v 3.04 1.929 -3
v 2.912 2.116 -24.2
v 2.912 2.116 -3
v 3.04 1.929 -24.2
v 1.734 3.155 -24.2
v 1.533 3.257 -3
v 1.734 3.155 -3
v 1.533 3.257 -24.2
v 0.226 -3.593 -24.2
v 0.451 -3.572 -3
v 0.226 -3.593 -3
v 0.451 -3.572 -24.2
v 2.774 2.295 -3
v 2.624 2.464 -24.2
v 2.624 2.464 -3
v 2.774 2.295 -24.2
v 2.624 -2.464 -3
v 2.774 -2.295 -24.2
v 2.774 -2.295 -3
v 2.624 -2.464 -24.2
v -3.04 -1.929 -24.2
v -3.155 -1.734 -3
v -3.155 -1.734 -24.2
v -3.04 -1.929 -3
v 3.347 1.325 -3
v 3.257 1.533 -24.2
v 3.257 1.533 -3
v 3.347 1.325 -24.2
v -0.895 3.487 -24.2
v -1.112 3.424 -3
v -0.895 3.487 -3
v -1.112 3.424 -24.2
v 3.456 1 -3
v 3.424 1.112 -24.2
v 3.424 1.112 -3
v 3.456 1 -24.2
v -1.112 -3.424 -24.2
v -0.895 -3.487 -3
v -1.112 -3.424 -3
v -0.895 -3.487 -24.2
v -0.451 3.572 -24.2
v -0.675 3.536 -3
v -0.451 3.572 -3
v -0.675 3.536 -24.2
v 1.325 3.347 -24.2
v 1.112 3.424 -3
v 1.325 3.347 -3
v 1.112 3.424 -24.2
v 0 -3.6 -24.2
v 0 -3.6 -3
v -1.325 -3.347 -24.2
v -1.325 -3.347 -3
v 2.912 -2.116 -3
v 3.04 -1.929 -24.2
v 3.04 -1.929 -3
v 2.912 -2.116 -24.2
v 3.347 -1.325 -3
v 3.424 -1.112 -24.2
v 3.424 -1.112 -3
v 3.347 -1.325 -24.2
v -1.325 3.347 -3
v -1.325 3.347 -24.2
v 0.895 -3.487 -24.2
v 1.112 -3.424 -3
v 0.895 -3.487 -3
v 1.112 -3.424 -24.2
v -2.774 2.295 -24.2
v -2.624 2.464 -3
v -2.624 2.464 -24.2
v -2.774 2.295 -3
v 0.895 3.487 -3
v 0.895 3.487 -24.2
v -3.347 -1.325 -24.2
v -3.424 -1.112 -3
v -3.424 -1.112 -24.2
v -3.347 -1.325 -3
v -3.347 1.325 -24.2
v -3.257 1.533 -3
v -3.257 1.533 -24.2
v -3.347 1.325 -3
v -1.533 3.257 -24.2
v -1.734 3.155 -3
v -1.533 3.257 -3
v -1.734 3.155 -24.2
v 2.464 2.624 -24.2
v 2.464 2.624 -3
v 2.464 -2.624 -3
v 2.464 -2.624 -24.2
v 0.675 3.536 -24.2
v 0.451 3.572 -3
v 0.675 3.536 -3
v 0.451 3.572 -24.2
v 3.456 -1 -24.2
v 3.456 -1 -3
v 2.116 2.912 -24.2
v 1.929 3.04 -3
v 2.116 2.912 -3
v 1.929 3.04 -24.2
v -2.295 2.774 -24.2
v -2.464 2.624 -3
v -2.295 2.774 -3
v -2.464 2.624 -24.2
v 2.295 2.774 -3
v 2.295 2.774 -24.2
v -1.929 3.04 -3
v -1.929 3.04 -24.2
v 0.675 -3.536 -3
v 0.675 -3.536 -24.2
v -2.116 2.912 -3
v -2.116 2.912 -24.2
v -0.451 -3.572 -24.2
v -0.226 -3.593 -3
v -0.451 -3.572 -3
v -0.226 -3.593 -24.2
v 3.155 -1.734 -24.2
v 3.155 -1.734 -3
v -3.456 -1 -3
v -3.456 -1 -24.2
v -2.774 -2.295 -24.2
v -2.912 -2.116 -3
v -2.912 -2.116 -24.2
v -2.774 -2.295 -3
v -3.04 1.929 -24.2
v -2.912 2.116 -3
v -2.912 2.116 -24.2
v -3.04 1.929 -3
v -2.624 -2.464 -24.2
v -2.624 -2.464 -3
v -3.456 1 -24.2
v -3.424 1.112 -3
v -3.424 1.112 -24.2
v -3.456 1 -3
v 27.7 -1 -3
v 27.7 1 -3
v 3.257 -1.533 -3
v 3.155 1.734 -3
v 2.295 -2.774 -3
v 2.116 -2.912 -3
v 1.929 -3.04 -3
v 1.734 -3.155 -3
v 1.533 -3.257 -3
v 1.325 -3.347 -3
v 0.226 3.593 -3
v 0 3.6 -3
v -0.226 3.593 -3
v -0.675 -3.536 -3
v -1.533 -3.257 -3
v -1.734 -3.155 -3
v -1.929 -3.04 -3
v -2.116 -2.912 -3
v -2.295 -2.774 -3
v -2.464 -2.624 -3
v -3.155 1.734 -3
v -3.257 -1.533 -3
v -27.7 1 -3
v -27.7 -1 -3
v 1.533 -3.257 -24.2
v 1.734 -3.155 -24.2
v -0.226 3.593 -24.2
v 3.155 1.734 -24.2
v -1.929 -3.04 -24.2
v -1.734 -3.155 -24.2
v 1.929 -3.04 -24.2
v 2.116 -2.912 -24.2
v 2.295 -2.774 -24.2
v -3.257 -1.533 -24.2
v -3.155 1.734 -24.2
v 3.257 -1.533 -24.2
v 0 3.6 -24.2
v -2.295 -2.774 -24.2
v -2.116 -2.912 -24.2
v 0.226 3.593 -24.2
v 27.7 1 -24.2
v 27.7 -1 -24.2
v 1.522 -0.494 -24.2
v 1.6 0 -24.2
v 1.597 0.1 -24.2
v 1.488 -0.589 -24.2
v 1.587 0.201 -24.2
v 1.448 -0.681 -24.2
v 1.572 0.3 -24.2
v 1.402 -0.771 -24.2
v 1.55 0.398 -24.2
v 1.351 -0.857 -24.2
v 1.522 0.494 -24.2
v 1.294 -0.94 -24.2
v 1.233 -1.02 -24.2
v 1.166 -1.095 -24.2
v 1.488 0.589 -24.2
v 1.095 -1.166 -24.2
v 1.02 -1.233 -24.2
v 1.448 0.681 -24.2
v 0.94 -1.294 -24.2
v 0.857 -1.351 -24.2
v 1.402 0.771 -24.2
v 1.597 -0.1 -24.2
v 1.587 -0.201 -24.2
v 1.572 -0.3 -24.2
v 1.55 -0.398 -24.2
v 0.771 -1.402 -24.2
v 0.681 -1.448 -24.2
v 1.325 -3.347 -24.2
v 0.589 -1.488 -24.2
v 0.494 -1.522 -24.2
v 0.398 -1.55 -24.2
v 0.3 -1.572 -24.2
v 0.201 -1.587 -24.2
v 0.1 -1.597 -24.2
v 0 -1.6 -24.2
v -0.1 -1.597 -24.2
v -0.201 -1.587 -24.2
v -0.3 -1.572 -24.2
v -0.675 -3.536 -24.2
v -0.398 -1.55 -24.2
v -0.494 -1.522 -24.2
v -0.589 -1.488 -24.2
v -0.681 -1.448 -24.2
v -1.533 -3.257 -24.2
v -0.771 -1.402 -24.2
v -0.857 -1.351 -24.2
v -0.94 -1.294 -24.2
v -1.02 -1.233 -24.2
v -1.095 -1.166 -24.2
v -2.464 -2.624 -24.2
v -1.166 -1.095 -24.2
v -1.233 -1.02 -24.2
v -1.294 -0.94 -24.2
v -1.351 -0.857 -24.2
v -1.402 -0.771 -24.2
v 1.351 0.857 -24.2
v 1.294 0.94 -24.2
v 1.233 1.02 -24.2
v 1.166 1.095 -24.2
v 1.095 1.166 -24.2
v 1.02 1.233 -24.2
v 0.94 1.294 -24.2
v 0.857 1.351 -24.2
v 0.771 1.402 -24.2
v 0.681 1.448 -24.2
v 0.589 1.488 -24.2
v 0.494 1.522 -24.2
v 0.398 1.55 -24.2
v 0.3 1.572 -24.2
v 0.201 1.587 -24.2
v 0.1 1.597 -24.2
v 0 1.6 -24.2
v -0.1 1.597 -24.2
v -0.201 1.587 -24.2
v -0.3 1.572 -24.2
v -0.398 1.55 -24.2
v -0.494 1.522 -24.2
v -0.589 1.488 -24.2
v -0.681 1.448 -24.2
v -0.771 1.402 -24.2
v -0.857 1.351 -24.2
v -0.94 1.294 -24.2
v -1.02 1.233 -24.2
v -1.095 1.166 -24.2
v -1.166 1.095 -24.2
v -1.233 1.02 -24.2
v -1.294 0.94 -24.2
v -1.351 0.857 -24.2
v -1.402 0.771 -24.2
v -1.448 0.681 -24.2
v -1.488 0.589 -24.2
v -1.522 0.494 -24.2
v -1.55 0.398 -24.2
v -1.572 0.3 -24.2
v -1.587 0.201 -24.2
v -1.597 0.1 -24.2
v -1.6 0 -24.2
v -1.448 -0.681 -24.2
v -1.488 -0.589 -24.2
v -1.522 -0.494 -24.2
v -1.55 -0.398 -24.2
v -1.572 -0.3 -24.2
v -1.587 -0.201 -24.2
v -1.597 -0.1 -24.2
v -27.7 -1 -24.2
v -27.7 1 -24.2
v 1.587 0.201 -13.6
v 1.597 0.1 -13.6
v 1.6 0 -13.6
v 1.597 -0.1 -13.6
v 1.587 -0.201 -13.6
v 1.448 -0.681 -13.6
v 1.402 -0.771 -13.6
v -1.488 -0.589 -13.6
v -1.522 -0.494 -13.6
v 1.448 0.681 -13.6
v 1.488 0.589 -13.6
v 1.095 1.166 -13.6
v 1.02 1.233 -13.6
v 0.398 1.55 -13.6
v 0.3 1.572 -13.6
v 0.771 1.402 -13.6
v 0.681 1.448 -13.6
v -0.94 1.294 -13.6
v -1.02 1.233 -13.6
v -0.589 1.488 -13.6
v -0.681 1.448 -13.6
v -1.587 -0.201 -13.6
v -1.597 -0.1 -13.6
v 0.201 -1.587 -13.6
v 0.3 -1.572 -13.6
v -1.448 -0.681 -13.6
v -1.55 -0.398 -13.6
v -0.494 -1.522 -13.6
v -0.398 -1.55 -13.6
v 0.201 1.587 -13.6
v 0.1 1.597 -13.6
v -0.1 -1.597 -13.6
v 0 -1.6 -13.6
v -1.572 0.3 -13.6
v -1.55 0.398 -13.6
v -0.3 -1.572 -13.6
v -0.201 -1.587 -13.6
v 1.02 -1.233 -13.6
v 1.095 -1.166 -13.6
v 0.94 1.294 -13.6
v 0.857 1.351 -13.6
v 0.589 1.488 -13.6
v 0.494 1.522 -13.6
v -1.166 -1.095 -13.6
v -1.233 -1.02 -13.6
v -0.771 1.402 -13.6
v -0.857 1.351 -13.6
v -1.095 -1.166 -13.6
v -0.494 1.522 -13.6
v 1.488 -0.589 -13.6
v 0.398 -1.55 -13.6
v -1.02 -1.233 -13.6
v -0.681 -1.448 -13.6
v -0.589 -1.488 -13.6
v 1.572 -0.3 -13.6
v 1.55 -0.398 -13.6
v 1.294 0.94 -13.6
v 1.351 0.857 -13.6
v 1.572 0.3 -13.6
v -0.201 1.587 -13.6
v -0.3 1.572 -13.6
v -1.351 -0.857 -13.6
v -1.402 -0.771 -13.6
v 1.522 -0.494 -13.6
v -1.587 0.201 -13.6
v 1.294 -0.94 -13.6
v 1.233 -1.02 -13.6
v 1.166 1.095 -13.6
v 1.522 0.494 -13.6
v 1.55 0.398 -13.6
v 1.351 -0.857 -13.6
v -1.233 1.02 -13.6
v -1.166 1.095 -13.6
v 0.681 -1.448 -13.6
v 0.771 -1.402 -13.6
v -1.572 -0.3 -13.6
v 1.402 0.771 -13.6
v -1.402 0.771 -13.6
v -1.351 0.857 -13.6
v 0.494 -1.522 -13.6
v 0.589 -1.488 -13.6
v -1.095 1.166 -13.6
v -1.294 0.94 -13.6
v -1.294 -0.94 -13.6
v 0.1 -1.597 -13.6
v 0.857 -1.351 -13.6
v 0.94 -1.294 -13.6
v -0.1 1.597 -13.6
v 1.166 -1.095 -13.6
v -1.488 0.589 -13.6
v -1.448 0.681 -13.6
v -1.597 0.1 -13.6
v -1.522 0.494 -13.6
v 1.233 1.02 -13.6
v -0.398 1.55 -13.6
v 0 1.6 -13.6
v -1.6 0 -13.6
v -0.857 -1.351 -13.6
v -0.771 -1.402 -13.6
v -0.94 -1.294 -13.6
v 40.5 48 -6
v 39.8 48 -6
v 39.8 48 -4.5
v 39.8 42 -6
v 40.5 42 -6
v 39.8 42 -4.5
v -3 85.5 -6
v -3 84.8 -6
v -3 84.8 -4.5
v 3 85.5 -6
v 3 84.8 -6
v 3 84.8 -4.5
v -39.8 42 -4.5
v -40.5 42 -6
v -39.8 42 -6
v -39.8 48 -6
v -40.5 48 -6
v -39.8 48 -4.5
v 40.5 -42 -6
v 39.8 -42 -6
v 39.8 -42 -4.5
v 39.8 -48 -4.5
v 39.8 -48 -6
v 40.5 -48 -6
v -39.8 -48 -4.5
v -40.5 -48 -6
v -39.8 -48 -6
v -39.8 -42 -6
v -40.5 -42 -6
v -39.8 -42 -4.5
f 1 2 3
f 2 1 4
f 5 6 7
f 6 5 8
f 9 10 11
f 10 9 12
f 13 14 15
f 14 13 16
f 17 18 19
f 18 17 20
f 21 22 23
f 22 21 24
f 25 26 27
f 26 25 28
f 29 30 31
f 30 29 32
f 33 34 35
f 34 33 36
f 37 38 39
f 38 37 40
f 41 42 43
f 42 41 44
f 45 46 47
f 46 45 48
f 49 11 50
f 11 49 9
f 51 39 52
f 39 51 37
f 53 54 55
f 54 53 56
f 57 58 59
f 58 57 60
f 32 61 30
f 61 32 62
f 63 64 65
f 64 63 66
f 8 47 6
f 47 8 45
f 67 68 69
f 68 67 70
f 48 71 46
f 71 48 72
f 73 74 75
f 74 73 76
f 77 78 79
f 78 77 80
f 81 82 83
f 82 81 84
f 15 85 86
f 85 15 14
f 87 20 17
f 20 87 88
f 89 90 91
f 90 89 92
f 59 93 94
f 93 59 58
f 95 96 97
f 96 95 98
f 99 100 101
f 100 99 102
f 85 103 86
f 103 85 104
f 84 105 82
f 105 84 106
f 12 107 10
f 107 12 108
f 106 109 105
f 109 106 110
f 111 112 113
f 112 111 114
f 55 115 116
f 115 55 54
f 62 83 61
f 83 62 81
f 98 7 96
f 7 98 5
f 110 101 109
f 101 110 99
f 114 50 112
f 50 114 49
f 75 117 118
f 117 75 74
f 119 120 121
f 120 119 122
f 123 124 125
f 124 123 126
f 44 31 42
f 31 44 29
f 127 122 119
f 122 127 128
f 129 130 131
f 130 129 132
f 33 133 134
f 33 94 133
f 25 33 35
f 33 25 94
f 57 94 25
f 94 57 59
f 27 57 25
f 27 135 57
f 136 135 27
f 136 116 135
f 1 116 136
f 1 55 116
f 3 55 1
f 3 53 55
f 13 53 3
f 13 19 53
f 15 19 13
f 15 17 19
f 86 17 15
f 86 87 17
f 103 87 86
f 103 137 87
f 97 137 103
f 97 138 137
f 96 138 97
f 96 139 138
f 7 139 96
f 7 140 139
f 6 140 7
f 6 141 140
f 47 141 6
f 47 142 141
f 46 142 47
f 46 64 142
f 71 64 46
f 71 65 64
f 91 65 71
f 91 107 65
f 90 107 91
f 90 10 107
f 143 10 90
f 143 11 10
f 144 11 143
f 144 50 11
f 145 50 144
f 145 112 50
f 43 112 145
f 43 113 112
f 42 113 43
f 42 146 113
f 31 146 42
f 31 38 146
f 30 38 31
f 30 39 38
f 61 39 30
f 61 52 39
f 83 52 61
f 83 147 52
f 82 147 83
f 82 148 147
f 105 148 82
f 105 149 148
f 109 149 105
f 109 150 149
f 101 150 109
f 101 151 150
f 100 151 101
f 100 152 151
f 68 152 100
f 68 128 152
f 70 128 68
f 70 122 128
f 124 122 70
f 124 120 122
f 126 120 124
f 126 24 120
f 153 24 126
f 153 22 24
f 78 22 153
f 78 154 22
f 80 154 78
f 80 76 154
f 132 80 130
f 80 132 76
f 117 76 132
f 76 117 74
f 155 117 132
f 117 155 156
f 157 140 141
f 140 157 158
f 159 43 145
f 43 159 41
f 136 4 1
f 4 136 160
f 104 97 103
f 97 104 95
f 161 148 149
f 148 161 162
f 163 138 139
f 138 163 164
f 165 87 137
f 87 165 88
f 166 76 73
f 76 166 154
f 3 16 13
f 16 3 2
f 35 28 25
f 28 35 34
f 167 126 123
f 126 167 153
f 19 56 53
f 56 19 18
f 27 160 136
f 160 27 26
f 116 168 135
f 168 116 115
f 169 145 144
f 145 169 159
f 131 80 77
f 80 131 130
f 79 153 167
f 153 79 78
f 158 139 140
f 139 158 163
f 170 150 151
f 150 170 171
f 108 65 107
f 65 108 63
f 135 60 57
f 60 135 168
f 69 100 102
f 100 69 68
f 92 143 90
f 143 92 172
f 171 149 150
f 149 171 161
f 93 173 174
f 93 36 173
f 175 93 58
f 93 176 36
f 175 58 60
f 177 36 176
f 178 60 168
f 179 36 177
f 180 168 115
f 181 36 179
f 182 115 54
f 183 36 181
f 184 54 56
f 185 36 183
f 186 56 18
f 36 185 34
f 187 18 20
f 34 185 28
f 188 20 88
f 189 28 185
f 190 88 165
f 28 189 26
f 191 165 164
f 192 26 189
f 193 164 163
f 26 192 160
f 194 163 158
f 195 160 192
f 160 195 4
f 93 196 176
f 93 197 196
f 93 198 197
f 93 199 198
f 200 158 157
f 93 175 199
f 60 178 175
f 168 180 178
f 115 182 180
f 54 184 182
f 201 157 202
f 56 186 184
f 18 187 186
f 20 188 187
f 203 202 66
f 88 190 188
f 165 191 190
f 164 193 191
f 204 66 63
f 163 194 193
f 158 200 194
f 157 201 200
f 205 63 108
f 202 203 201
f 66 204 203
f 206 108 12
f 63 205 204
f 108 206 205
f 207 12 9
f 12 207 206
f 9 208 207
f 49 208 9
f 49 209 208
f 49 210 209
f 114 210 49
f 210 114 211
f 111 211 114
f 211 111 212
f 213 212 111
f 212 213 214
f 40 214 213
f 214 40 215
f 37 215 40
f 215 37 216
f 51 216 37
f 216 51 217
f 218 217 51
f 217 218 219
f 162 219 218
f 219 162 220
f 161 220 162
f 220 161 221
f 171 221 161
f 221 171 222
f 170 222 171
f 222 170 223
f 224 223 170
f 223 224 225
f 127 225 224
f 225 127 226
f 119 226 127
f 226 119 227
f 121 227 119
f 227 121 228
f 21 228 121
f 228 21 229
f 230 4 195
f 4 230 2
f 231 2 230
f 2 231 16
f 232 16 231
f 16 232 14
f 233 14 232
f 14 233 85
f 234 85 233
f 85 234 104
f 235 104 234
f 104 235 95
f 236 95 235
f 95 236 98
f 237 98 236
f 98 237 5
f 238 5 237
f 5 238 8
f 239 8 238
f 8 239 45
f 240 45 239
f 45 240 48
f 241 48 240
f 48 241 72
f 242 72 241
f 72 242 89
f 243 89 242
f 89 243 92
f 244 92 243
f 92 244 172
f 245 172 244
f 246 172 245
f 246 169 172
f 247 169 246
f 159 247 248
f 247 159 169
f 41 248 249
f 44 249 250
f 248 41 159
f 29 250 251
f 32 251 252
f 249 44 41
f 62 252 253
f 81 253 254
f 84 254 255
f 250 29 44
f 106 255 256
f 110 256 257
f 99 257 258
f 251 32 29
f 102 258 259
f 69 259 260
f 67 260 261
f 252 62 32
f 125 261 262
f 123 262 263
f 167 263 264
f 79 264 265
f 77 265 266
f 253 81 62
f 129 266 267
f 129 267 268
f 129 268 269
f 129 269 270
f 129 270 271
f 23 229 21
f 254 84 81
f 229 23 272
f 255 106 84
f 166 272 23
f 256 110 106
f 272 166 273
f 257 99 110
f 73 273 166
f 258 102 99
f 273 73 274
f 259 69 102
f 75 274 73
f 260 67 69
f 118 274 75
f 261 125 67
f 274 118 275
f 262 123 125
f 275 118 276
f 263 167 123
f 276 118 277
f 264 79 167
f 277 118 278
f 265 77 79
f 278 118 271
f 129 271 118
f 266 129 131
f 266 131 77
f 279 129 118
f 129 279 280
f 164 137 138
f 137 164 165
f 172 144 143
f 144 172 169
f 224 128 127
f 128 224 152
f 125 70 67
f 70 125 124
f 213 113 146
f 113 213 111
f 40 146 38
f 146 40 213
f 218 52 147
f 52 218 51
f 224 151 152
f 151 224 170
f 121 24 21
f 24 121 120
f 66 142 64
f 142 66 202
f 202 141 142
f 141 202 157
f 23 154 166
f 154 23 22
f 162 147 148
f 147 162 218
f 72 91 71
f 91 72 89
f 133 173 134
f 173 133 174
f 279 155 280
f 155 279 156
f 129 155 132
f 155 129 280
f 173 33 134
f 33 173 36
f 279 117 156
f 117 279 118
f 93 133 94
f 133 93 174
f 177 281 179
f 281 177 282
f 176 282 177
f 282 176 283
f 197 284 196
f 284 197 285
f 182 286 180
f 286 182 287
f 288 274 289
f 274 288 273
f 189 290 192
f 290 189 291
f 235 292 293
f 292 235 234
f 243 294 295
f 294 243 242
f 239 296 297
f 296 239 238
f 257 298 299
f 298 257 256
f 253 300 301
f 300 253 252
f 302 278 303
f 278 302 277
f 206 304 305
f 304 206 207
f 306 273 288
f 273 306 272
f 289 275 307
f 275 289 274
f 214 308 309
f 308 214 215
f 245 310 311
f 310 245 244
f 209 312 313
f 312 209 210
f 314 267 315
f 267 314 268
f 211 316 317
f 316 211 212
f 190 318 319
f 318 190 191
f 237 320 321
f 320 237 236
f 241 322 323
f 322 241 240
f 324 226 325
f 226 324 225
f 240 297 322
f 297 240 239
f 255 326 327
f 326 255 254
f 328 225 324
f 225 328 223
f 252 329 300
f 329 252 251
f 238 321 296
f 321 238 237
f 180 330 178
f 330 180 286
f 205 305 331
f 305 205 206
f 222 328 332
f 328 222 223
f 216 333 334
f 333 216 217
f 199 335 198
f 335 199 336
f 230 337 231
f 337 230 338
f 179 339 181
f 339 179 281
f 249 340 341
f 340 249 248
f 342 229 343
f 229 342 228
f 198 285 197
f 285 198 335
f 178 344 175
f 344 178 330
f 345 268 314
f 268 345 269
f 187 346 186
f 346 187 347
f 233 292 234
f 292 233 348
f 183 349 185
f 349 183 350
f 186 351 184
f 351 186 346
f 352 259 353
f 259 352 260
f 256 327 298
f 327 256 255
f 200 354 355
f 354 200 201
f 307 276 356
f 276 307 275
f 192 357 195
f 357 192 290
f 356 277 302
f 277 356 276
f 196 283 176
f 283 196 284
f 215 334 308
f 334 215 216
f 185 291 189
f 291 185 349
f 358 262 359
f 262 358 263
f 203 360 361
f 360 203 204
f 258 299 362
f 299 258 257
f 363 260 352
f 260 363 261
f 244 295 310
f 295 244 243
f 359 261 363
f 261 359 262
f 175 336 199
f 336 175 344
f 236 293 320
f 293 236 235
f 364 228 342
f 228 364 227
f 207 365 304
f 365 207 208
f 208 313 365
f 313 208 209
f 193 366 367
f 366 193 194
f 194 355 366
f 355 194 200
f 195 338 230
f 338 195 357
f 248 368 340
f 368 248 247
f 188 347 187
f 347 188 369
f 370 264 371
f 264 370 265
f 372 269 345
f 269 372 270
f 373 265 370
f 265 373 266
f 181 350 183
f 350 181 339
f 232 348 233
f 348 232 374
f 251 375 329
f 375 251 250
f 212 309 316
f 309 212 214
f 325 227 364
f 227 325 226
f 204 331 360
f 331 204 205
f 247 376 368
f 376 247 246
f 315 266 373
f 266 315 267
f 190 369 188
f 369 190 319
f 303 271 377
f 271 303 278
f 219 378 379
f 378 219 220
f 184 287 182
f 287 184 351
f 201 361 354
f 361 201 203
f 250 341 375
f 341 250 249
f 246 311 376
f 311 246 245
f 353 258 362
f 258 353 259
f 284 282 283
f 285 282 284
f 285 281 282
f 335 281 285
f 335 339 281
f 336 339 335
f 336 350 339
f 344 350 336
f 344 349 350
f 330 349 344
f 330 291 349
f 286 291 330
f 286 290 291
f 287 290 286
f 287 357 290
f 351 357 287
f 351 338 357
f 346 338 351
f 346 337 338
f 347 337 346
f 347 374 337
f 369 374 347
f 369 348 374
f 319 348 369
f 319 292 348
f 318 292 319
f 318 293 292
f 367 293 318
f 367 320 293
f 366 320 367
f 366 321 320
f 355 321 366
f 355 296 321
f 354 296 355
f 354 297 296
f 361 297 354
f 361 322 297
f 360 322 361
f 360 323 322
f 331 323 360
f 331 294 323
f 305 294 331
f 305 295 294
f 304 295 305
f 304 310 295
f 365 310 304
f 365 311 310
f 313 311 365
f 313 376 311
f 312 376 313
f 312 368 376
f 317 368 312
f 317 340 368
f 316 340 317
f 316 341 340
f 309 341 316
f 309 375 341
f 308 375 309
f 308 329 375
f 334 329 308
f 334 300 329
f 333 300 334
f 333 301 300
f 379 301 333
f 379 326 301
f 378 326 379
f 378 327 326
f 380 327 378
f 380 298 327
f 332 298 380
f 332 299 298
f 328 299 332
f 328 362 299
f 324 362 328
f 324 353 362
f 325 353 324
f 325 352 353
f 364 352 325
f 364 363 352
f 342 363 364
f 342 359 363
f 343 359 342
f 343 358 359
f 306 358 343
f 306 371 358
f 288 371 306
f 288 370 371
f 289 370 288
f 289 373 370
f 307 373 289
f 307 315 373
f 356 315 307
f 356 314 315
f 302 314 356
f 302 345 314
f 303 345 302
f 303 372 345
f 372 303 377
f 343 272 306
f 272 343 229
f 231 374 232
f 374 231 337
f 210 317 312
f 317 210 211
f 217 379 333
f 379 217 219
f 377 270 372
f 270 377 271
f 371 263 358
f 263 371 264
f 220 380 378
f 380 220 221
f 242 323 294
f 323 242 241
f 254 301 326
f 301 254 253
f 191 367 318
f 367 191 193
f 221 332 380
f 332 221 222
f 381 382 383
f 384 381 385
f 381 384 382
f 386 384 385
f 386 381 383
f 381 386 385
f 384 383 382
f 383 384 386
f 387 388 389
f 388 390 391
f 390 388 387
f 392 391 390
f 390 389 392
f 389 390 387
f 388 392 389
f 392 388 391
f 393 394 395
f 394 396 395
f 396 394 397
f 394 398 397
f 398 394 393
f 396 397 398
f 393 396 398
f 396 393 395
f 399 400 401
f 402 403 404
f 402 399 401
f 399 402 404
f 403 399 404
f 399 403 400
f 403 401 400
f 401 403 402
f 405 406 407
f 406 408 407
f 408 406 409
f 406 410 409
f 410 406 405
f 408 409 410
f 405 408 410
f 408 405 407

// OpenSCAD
// file: Bevel_Extrude_Module_for_OpenSCAD/bevel_extrude.scad
bevel_extrude_example();

module bevel_extrude_example()
{
	bevel_extrude(height=10,bevel_depth=2,$fn=16) 
	example_shape();
}

module example_shape()
{
	union()
	{
		square([8,30],true);
		rotate(30)
		square([35,8],true);
	
		translate([0,15])
		square([30,8],true);
	}
}

module bevel_border(size=1)
{
	difference()
	{
		minkowski()
		{
			child();
			square(size,true);
		}
		child();
	}
}

module bevel_cutaway(bevel_depth=5)
{
	translate([0,0,-bevel_depth])
	minkowski()
	{
		linear_extrude(height=bevel_depth,convexity=5)
		bevel_border(1)
		child();
		cylinder(h=bevel_depth+1,r1=0,r2=bevel_depth*sqrt(2));
	}
}

module bevel_extrude(height=20,bevel_depth=1)
{
	difference()
	{
		linear_extrude(height=height,convexity=5)
		child();

		translate([0,0,height])
		bevel_cutaway(bevel_depth)
		child();
	}	
}
// main file
// CO2 Ampel - Case
// By: FabLab Karlsruhe e.V., Martina Feger
// Date: 19.10.2020
// License: MIT

// https://www.thingiverse.com/thing:135408/files
use <Bevel_Extrude_Module_for_OpenSCAD/bevel_extrude.scad>

$fn=100;
pcb_length=168;
pcb_width=78;

wall=2; //min=2 !
base=2;
lidThick=3;
gap=1;  //puffer (auf jeder seite) zwischen pcb und gehaeuse

lid();

module lid(){
    difference(){
        union(){
            mirror([0,0,1]) translate([-39,-84,lidThick]) mirror([0,0,1]) bevel_extrude(height=lidThick, bevel_depth=(0.5*lidThick), $fn=50) offset(r=wall+gap) import (file = "/mnt/io/gemeinsam/co2ampel/pcb.dxf");
            screwFastening();
            lidFastening();
        }
        translate([0,45,-10]) cylinder(d=74, h=20, center = false); //top window
        translate([0,-45,-10]) cylinder(d=74, h=20, center = false); //bottom window
    }
    powerHoleFilling();
    switchHoleFilling();
}


module lidFastening(){
    lidHoleFilling(0,"top");
    lidHoleFilling(90,"top");
    lidHoleFilling(180,"top");
    
    lidHoleFilling(0,"bottom");
    lidHoleFilling(180,"bottom");
}


module lidHoleFilling(alpha, segment){
    r = 39.8;
    if (segment == "top"){
        intersection(){
            translate([-39,-84,-(8+lidThick)]) linear_extrude(height=8, center = false, convexity = 200) offset(r=1) import (file = "/mnt/io/gemeinsam/co2ampel/pcb.dxf");
            translate([0,45,-(lidThick+1.5)]) translate([r*cos(alpha),r*sin(alpha),0]) rotate([0,0,alpha]) translate([-4,0,0]) cube([8,6,3], center = true);
        }
        translate([0,45,-(lidThick+3)]) translate([r*cos(alpha),r*sin(alpha),0]) rotate([0,0,alpha]) rotate([90,0,0]) linear_extrude(height = 6, center = true) polygon(points = [[0,0], [0.7,0], [0,1.5]]);
    } else if (segment == "bottom"){
        intersection(){
            translate([-39,-84,-(8+lidThick)]) linear_extrude(height=8, center = false, convexity = 200) offset(r=1) import (file = "/mnt/io/gemeinsam/co2ampel/pcb.dxf");
            translate([0,-45,-(lidThick+1.5)]) translate([r*cos(alpha),r*sin(alpha),0]) rotate([0,0,alpha]) translate([-4,0,0]) cube([8,6,3], center = true);
        }
        translate([0,-45,-(lidThick+3)]) translate([r*cos(alpha),r*sin(alpha),0]) rotate([0,0,alpha]) rotate([90,0,0]) linear_extrude(height = 6, center = true) polygon(points = [[0,0], [0.7,0], [0,1.5]]);
    }
}



module powerHoleFilling(){
    translate([0,0,-10.4]) intersection(){
        difference(){
            translate([-39,-84,-lidThick]) linear_extrude(height=10.4, center = false, convexity = 200) offset(r=wall+gap) import (file = "/mnt/io/gemeinsam/co2ampel/pcb.dxf");
            translate([-39,-84,-lidThick]) linear_extrude(height=10.4, center = false, convexity = 200) offset(r=gap)  import (file = "/mnt/io/gemeinsam/co2ampel/pcb.dxf");
        }
        //translate([0,-85,0]) cube([12.4,10,24], center = true);
        translate([0,-85,0]) cube([12.2,10,24], center = true);
    }
}


module switchHoleFilling(){
    translate([0,0,-16.2]) intersection(){
        difference(){
            translate([-39,-84,-lidThick]) linear_extrude(height=16.2, center = false, convexity = 200) offset(r=wall+gap) import (file = "/mnt/io/gemeinsam/co2ampel/pcb.dxf");
            translate([-39,-84,-lidThick]) linear_extrude(height=16.2, center = false, convexity = 200) offset(r=gap)  import (file = "/mnt/io/gemeinsam/co2ampel/pcb.dxf");
        }
        alpha = -151;
        //translate([45*cos(alpha),45*sin(alpha)-45,13]) rotate([0,0,alpha]) cube([15,10.6,34], center = true);
        translate([45*cos(alpha),45*sin(alpha)-45,13]) rotate([0,0,alpha]) cube([15,10.4,34], center = true);
    }
}


module screwFastening(){
    translate([0,0,-(21.2+lidThick)]){
        difference(){
            union(){
                cylinder(d = 7.2, h = 21.2, centre = true);
                translate([0,0,10.6]) cube([55.4,2,21.2], center = true);
            }
            cylinder(d = 3.2, h = 21.2, center = true);
        }
    }
}
